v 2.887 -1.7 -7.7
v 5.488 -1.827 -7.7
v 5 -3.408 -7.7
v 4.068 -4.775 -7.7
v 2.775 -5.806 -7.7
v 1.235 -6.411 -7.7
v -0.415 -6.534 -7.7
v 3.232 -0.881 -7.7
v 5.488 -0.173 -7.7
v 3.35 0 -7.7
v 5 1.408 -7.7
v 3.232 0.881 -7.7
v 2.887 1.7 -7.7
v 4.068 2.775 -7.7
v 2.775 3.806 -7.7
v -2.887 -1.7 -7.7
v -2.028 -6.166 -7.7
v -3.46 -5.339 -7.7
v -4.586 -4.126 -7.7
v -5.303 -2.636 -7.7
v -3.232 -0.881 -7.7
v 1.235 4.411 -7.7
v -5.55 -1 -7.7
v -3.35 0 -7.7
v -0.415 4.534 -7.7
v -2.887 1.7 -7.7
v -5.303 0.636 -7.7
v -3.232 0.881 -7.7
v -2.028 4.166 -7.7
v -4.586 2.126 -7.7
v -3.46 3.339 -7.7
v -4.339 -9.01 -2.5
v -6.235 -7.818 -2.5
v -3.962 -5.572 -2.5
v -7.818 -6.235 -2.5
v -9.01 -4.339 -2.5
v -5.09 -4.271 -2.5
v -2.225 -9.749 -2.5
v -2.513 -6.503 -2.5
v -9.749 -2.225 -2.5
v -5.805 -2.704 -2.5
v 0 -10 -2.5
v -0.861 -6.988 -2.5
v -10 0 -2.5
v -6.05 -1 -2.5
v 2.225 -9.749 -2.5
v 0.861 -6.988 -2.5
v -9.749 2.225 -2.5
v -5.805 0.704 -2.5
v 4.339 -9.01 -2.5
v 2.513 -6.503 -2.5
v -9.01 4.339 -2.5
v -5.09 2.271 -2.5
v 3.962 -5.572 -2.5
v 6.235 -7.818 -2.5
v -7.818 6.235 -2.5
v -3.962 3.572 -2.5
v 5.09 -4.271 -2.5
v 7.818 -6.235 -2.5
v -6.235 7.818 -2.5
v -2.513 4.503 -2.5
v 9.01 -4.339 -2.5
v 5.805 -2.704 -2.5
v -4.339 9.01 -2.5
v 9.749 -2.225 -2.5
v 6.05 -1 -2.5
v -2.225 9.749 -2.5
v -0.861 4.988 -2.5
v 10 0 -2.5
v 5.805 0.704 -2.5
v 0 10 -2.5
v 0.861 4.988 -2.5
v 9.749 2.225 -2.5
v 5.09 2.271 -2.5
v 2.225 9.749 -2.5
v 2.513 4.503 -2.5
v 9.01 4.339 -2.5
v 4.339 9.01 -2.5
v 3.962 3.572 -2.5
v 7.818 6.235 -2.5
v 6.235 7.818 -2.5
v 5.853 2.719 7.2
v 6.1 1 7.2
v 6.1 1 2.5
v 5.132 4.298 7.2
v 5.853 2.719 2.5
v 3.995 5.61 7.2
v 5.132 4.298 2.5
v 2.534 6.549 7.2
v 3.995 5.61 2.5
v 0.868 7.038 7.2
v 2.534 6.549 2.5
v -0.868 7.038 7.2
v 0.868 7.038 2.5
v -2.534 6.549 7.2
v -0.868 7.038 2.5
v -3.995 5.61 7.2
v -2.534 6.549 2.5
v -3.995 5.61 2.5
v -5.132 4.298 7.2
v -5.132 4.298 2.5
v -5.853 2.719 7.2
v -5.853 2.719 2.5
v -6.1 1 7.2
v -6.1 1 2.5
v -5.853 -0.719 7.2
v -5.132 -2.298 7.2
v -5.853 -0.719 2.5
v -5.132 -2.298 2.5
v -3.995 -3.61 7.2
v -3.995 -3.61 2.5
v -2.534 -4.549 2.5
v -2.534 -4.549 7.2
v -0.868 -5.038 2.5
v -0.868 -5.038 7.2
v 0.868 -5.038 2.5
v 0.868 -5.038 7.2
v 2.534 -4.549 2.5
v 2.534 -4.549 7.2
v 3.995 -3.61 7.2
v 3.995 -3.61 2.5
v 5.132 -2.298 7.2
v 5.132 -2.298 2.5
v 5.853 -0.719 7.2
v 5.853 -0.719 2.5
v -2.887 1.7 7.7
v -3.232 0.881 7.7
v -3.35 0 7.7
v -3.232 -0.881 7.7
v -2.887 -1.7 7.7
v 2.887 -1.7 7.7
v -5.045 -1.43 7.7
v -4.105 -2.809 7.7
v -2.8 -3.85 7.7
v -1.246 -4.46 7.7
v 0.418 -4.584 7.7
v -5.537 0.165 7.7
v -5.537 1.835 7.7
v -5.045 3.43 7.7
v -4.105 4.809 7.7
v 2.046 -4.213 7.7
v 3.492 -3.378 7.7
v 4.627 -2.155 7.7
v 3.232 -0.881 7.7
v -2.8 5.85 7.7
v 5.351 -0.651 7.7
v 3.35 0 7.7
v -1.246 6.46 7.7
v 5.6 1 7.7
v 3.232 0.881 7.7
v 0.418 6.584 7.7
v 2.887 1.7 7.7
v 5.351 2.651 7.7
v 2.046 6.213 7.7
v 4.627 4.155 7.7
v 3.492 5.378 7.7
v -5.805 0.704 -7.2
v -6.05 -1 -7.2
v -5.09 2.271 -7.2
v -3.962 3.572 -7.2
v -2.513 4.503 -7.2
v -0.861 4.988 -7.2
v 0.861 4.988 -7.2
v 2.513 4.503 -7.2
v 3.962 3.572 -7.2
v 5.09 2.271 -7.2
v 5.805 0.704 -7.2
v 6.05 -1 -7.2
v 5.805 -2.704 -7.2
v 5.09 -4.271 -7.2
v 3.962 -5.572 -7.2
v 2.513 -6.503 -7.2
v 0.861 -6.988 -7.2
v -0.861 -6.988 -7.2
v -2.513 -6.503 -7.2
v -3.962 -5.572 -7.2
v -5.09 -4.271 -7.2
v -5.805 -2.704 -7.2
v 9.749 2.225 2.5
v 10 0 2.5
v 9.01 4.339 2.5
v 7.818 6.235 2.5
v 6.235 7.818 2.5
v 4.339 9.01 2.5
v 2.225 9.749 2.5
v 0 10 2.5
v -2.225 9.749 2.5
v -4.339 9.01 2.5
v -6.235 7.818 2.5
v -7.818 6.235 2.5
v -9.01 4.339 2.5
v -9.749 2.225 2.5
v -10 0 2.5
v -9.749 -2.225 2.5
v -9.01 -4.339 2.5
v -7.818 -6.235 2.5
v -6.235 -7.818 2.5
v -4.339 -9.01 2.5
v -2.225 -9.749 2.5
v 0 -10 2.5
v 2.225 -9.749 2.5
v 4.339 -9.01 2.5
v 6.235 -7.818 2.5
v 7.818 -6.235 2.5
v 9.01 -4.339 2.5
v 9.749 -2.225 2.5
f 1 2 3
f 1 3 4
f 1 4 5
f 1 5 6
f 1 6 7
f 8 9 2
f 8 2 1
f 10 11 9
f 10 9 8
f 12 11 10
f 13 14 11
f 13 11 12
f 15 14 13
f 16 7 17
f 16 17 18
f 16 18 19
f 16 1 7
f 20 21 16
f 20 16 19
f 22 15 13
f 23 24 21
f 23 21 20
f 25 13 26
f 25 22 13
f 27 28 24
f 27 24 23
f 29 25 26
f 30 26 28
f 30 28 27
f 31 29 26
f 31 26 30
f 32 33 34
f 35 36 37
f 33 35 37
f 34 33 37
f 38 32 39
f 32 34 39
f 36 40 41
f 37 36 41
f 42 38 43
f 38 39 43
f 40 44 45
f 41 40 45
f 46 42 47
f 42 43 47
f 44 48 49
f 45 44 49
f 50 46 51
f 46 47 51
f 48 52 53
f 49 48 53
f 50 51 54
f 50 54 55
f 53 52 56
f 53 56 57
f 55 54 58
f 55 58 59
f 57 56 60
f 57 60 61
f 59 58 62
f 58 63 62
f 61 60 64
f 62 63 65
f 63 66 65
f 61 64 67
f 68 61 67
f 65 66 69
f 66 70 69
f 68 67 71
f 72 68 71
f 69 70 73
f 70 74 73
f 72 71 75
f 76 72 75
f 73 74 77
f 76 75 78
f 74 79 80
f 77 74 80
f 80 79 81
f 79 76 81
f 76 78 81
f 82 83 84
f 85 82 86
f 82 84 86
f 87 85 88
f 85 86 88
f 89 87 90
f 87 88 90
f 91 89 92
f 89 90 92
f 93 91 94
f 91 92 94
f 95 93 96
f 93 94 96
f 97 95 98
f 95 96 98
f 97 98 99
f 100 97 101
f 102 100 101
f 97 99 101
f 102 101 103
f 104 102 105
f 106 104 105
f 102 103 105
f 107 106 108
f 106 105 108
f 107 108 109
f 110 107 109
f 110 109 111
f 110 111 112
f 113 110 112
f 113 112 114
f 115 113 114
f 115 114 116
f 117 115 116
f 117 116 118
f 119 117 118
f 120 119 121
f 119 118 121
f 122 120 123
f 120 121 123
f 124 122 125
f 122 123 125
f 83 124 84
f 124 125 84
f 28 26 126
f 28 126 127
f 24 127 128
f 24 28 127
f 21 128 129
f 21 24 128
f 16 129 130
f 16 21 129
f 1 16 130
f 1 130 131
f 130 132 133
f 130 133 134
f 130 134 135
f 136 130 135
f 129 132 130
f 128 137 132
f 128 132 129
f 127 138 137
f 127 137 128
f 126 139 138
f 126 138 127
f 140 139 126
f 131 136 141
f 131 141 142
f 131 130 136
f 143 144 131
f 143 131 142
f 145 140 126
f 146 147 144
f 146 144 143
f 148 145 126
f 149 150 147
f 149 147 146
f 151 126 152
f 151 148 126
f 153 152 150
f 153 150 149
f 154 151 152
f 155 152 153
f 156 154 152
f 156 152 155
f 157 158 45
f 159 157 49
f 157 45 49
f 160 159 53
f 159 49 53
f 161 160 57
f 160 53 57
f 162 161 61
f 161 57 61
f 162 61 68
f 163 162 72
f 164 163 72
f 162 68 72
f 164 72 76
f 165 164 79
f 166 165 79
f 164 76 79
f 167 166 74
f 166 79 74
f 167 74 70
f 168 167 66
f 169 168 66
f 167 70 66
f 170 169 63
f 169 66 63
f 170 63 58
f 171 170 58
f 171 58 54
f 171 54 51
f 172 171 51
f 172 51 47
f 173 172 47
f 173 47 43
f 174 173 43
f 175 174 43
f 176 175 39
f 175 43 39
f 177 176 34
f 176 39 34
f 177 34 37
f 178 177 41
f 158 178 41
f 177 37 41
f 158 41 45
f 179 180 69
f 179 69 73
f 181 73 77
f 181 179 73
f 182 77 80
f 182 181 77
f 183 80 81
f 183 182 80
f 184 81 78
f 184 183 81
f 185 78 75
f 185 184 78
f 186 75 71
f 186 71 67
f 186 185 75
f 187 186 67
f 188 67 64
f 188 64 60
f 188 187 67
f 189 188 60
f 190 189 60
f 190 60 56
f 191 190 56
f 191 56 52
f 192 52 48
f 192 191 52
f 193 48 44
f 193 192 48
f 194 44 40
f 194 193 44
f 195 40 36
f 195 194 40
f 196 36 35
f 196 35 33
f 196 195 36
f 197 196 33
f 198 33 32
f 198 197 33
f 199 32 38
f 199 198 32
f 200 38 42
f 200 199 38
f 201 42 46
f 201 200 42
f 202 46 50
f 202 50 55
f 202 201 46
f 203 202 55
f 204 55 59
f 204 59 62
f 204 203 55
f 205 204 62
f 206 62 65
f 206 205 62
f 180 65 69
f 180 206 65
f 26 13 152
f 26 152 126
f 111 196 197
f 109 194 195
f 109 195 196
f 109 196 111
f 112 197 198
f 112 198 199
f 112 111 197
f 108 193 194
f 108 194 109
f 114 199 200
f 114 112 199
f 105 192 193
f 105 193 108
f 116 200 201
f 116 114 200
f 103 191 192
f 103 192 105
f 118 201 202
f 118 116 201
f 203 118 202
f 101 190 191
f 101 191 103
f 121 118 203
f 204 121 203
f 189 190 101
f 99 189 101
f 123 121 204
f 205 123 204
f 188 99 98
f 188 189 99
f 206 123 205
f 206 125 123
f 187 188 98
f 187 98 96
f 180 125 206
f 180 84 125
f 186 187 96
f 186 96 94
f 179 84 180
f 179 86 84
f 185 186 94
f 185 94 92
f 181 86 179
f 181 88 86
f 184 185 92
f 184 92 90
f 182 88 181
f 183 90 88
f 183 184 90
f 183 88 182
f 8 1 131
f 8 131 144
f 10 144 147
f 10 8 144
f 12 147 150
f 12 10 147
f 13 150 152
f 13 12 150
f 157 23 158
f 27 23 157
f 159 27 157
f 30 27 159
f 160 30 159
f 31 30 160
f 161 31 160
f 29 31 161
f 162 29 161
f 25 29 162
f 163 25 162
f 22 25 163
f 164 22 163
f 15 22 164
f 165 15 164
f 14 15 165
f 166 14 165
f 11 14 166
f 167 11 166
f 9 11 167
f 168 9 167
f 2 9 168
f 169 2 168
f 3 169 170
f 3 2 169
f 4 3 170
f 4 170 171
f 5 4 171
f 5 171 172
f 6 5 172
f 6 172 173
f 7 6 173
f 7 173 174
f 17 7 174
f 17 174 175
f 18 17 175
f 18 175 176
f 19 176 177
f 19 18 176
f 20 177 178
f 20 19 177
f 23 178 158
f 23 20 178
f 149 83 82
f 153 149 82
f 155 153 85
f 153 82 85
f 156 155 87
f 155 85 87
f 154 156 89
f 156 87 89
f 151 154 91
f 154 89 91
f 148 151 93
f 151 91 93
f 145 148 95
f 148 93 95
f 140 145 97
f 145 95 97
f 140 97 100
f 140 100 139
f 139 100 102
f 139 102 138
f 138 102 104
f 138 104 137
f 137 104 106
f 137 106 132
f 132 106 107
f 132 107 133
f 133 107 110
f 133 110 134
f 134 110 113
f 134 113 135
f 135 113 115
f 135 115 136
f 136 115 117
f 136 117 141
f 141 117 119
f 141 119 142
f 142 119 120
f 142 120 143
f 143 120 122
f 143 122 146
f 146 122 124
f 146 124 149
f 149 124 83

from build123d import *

# Parameters (mm, degrees)
SKETCH6_R               = 6
BOSS_EXTRUDE4_DEPTH     = 2.5
SKETCH7_R               = 6.1
BOSS_EXTRUDE5_DEPTH     = 5.2
SKETCH8_R               = 6.05
BOSS_EXTRUDE6_DEPTH     = 5.2
SKETCH13_R              = 10
BOSS_EXTRUDE7_DEPTH     = 5
CUT_EXTRUDE1_DEPTH      = 6.2
CUT_EXTRUDE1_DEPTH_BACK = 11.2
CHAMFER1_SIZE           = 0.5


with BuildPart() as part:
    # Sketch6 → Boss-Extrude4 (new body, symmetric)
    with BuildSketch(Plane.XY):
        Circle(SKETCH6_R)
    extrude(amount=BOSS_EXTRUDE4_DEPTH, both=True)

    # Sketch7 → Boss-Extrude5 (add)
    with BuildSketch(Plane.XY.offset(2.5)):
        with Locations((0, 1)):
            Circle(SKETCH7_R)
    extrude(amount=BOSS_EXTRUDE5_DEPTH)

    # Sketch8 → Boss-Extrude6 (add)
    with BuildSketch(Plane(origin=(0, 0, -2.5), x_dir=(-1, 0, 0), z_dir=(0, 0, -1))):
        with Locations((0, -1)):
            Circle(SKETCH8_R)
    extrude(amount=BOSS_EXTRUDE6_DEPTH)

    # Sketch13 → Boss-Extrude7 (add)
    with BuildSketch(Plane.XY.offset(2.5)):
        Circle(SKETCH13_R)
    extrude(amount=-BOSS_EXTRUDE7_DEPTH)

    # Sketch11 → Cut-Extrude1 (cut, two sides)
    with BuildSketch(Plane.XY.offset(2.5)) as cut_extrude1_sk:
        with BuildLine():
            Line((-2.886607005, -1.7), (2.886607005, -1.7))
            ThreePointArc((2.886607005, -1.7), (3.35, 0), (2.886607005, 1.7))
            Line((2.886607005, 1.7), (-2.886607005, 1.7))
            ThreePointArc((-2.886607005, 1.7), (-3.35, 0), (-2.886607005, -1.7))
        make_face()
    extrude(amount=CUT_EXTRUDE1_DEPTH, mode=Mode.SUBTRACT)
    extrude(cut_extrude1_sk.sketch, amount=-CUT_EXTRUDE1_DEPTH_BACK, mode=Mode.SUBTRACT)

    # Chamfer1
    chamfer1_edges = [part.edges().sort_by_distance(p)[0] for p in [
        (6.05, -1, -7.7),
        (-6.1, 1, 7.7),
    ]]
    chamfer(chamfer1_edges, length=CHAMFER1_SIZE)


solid = part.part
